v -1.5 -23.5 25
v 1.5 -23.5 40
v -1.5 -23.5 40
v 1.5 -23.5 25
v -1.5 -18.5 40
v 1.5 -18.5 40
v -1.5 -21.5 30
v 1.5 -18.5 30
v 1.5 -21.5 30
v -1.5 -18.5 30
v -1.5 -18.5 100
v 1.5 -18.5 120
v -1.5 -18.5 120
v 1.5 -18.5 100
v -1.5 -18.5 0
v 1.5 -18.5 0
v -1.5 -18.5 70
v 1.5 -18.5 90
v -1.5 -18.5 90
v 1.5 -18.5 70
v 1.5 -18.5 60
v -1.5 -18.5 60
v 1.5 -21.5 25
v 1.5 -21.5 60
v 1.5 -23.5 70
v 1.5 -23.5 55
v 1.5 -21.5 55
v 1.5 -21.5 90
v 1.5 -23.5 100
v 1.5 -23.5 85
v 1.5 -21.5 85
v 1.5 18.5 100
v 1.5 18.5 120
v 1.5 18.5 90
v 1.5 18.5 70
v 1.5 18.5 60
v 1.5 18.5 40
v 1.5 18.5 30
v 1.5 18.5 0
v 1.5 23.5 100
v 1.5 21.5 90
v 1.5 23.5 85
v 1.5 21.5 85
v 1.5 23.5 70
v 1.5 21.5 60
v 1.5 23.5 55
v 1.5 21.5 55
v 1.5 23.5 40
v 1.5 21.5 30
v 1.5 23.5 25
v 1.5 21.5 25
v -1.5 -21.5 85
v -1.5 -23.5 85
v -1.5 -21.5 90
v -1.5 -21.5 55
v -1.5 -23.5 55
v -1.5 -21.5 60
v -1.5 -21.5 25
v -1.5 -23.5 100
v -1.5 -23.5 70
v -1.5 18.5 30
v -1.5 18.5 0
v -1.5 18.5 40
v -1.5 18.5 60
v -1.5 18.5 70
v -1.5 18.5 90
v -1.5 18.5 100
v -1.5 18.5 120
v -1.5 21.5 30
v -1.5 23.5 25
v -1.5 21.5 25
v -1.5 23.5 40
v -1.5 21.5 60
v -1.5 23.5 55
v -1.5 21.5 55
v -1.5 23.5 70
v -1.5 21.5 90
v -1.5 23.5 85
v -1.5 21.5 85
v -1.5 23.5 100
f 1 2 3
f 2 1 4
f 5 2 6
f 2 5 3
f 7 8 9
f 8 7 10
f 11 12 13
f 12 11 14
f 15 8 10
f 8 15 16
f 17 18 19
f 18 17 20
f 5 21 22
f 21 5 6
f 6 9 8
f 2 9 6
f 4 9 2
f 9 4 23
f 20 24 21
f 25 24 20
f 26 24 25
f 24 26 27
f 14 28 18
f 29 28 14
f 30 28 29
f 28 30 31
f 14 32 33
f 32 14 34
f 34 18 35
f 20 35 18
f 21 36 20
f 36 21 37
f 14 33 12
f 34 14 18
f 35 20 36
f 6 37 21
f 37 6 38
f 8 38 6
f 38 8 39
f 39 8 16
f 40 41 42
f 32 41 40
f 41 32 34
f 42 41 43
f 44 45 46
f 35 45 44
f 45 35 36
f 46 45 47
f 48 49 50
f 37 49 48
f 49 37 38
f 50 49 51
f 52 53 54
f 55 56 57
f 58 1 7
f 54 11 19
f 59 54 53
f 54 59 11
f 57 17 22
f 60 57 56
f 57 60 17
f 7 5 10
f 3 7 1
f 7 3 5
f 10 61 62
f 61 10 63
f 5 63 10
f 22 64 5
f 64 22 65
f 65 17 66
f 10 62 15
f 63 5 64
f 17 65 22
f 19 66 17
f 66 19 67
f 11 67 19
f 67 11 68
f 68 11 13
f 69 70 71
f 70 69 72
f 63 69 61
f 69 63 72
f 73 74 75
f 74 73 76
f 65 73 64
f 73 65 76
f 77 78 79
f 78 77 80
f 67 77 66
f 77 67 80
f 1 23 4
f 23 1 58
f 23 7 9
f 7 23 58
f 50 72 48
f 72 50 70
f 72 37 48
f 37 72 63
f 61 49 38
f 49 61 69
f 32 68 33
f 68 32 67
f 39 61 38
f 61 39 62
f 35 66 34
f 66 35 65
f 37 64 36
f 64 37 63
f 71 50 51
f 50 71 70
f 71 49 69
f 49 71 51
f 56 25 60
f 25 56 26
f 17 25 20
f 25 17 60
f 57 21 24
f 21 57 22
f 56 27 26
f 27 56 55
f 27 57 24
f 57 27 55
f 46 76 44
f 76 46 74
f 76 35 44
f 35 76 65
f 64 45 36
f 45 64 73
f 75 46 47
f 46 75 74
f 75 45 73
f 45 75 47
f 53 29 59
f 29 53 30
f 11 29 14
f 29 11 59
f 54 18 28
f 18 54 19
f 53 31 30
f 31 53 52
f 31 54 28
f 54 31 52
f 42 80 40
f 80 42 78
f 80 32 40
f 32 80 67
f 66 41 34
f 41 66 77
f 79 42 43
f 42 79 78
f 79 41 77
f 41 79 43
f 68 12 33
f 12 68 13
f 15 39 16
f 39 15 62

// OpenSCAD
// file: hook.scad
include <config.scad>;

module joint()
{
    // center in y-direction
    translate([
        0,
        -material_width/2,
        0
        ])
    {
        // main support structure
        cube([
            joint_x,
            material_width,
            joint_y
            ]);

        // add hook
        translate([
            material_width,
            0,
            -joint_hook_y
            ])
            cube([
                joint_x - material_width,
                material_width,
                joint_hook_y
                ]);
    }
}

joint();
// file: config.scad
// all measures in mm

material_x = 510;
material_y = 370;
material_width = 3;

leg_x = 50;
leg_y = 40;
leg_z = 120;

// about hoch much the faces in Y direction are inset
face_y_inset = 5;

// how far the joint extends planarly from the face
joint_x = 5;
// the lateral width of the joint
joint_y = 10;
// how far down the hook extends
joint_hook_y = 5;

joint_total_height = joint_y + joint_hook_y;

num_joints = 3;
q = leg_z/4;
joint_height = [q, 2*q, 3*q];

// how far apart from on another to project the parts
projection_spacing = 1;

// rendering quality (face number)
$fn = 50;
// main file
include <config.scad>;
use <hook.scad>;

/**
 * One of the two planes lying in YZ layer
 */
module face_y()
{
    color("green")
    // center
    translate([
        0,
        -(leg_y - material_width)/2,
        0
        ])
    {
        // basic rectangular face
        translate([
            -material_width/2,
            0,
            0])
            cube([
                material_width,
                leg_y - material_width,
                leg_z
                ]);

        /*
         * add joints
         */
        for (z = joint_height)
        {
            // add all the configured heights
            translate([
                0,
                0,
                z
                ])
            {
                // in the direction of -Y
                rotate([0, 0, -90])
                    joint();

                // in the direction of +Y
                translate([0, leg_y - material_width, 0])
                    rotate([0, 0, 90])
                        joint();
            }
        }
    }
}

face_y();
